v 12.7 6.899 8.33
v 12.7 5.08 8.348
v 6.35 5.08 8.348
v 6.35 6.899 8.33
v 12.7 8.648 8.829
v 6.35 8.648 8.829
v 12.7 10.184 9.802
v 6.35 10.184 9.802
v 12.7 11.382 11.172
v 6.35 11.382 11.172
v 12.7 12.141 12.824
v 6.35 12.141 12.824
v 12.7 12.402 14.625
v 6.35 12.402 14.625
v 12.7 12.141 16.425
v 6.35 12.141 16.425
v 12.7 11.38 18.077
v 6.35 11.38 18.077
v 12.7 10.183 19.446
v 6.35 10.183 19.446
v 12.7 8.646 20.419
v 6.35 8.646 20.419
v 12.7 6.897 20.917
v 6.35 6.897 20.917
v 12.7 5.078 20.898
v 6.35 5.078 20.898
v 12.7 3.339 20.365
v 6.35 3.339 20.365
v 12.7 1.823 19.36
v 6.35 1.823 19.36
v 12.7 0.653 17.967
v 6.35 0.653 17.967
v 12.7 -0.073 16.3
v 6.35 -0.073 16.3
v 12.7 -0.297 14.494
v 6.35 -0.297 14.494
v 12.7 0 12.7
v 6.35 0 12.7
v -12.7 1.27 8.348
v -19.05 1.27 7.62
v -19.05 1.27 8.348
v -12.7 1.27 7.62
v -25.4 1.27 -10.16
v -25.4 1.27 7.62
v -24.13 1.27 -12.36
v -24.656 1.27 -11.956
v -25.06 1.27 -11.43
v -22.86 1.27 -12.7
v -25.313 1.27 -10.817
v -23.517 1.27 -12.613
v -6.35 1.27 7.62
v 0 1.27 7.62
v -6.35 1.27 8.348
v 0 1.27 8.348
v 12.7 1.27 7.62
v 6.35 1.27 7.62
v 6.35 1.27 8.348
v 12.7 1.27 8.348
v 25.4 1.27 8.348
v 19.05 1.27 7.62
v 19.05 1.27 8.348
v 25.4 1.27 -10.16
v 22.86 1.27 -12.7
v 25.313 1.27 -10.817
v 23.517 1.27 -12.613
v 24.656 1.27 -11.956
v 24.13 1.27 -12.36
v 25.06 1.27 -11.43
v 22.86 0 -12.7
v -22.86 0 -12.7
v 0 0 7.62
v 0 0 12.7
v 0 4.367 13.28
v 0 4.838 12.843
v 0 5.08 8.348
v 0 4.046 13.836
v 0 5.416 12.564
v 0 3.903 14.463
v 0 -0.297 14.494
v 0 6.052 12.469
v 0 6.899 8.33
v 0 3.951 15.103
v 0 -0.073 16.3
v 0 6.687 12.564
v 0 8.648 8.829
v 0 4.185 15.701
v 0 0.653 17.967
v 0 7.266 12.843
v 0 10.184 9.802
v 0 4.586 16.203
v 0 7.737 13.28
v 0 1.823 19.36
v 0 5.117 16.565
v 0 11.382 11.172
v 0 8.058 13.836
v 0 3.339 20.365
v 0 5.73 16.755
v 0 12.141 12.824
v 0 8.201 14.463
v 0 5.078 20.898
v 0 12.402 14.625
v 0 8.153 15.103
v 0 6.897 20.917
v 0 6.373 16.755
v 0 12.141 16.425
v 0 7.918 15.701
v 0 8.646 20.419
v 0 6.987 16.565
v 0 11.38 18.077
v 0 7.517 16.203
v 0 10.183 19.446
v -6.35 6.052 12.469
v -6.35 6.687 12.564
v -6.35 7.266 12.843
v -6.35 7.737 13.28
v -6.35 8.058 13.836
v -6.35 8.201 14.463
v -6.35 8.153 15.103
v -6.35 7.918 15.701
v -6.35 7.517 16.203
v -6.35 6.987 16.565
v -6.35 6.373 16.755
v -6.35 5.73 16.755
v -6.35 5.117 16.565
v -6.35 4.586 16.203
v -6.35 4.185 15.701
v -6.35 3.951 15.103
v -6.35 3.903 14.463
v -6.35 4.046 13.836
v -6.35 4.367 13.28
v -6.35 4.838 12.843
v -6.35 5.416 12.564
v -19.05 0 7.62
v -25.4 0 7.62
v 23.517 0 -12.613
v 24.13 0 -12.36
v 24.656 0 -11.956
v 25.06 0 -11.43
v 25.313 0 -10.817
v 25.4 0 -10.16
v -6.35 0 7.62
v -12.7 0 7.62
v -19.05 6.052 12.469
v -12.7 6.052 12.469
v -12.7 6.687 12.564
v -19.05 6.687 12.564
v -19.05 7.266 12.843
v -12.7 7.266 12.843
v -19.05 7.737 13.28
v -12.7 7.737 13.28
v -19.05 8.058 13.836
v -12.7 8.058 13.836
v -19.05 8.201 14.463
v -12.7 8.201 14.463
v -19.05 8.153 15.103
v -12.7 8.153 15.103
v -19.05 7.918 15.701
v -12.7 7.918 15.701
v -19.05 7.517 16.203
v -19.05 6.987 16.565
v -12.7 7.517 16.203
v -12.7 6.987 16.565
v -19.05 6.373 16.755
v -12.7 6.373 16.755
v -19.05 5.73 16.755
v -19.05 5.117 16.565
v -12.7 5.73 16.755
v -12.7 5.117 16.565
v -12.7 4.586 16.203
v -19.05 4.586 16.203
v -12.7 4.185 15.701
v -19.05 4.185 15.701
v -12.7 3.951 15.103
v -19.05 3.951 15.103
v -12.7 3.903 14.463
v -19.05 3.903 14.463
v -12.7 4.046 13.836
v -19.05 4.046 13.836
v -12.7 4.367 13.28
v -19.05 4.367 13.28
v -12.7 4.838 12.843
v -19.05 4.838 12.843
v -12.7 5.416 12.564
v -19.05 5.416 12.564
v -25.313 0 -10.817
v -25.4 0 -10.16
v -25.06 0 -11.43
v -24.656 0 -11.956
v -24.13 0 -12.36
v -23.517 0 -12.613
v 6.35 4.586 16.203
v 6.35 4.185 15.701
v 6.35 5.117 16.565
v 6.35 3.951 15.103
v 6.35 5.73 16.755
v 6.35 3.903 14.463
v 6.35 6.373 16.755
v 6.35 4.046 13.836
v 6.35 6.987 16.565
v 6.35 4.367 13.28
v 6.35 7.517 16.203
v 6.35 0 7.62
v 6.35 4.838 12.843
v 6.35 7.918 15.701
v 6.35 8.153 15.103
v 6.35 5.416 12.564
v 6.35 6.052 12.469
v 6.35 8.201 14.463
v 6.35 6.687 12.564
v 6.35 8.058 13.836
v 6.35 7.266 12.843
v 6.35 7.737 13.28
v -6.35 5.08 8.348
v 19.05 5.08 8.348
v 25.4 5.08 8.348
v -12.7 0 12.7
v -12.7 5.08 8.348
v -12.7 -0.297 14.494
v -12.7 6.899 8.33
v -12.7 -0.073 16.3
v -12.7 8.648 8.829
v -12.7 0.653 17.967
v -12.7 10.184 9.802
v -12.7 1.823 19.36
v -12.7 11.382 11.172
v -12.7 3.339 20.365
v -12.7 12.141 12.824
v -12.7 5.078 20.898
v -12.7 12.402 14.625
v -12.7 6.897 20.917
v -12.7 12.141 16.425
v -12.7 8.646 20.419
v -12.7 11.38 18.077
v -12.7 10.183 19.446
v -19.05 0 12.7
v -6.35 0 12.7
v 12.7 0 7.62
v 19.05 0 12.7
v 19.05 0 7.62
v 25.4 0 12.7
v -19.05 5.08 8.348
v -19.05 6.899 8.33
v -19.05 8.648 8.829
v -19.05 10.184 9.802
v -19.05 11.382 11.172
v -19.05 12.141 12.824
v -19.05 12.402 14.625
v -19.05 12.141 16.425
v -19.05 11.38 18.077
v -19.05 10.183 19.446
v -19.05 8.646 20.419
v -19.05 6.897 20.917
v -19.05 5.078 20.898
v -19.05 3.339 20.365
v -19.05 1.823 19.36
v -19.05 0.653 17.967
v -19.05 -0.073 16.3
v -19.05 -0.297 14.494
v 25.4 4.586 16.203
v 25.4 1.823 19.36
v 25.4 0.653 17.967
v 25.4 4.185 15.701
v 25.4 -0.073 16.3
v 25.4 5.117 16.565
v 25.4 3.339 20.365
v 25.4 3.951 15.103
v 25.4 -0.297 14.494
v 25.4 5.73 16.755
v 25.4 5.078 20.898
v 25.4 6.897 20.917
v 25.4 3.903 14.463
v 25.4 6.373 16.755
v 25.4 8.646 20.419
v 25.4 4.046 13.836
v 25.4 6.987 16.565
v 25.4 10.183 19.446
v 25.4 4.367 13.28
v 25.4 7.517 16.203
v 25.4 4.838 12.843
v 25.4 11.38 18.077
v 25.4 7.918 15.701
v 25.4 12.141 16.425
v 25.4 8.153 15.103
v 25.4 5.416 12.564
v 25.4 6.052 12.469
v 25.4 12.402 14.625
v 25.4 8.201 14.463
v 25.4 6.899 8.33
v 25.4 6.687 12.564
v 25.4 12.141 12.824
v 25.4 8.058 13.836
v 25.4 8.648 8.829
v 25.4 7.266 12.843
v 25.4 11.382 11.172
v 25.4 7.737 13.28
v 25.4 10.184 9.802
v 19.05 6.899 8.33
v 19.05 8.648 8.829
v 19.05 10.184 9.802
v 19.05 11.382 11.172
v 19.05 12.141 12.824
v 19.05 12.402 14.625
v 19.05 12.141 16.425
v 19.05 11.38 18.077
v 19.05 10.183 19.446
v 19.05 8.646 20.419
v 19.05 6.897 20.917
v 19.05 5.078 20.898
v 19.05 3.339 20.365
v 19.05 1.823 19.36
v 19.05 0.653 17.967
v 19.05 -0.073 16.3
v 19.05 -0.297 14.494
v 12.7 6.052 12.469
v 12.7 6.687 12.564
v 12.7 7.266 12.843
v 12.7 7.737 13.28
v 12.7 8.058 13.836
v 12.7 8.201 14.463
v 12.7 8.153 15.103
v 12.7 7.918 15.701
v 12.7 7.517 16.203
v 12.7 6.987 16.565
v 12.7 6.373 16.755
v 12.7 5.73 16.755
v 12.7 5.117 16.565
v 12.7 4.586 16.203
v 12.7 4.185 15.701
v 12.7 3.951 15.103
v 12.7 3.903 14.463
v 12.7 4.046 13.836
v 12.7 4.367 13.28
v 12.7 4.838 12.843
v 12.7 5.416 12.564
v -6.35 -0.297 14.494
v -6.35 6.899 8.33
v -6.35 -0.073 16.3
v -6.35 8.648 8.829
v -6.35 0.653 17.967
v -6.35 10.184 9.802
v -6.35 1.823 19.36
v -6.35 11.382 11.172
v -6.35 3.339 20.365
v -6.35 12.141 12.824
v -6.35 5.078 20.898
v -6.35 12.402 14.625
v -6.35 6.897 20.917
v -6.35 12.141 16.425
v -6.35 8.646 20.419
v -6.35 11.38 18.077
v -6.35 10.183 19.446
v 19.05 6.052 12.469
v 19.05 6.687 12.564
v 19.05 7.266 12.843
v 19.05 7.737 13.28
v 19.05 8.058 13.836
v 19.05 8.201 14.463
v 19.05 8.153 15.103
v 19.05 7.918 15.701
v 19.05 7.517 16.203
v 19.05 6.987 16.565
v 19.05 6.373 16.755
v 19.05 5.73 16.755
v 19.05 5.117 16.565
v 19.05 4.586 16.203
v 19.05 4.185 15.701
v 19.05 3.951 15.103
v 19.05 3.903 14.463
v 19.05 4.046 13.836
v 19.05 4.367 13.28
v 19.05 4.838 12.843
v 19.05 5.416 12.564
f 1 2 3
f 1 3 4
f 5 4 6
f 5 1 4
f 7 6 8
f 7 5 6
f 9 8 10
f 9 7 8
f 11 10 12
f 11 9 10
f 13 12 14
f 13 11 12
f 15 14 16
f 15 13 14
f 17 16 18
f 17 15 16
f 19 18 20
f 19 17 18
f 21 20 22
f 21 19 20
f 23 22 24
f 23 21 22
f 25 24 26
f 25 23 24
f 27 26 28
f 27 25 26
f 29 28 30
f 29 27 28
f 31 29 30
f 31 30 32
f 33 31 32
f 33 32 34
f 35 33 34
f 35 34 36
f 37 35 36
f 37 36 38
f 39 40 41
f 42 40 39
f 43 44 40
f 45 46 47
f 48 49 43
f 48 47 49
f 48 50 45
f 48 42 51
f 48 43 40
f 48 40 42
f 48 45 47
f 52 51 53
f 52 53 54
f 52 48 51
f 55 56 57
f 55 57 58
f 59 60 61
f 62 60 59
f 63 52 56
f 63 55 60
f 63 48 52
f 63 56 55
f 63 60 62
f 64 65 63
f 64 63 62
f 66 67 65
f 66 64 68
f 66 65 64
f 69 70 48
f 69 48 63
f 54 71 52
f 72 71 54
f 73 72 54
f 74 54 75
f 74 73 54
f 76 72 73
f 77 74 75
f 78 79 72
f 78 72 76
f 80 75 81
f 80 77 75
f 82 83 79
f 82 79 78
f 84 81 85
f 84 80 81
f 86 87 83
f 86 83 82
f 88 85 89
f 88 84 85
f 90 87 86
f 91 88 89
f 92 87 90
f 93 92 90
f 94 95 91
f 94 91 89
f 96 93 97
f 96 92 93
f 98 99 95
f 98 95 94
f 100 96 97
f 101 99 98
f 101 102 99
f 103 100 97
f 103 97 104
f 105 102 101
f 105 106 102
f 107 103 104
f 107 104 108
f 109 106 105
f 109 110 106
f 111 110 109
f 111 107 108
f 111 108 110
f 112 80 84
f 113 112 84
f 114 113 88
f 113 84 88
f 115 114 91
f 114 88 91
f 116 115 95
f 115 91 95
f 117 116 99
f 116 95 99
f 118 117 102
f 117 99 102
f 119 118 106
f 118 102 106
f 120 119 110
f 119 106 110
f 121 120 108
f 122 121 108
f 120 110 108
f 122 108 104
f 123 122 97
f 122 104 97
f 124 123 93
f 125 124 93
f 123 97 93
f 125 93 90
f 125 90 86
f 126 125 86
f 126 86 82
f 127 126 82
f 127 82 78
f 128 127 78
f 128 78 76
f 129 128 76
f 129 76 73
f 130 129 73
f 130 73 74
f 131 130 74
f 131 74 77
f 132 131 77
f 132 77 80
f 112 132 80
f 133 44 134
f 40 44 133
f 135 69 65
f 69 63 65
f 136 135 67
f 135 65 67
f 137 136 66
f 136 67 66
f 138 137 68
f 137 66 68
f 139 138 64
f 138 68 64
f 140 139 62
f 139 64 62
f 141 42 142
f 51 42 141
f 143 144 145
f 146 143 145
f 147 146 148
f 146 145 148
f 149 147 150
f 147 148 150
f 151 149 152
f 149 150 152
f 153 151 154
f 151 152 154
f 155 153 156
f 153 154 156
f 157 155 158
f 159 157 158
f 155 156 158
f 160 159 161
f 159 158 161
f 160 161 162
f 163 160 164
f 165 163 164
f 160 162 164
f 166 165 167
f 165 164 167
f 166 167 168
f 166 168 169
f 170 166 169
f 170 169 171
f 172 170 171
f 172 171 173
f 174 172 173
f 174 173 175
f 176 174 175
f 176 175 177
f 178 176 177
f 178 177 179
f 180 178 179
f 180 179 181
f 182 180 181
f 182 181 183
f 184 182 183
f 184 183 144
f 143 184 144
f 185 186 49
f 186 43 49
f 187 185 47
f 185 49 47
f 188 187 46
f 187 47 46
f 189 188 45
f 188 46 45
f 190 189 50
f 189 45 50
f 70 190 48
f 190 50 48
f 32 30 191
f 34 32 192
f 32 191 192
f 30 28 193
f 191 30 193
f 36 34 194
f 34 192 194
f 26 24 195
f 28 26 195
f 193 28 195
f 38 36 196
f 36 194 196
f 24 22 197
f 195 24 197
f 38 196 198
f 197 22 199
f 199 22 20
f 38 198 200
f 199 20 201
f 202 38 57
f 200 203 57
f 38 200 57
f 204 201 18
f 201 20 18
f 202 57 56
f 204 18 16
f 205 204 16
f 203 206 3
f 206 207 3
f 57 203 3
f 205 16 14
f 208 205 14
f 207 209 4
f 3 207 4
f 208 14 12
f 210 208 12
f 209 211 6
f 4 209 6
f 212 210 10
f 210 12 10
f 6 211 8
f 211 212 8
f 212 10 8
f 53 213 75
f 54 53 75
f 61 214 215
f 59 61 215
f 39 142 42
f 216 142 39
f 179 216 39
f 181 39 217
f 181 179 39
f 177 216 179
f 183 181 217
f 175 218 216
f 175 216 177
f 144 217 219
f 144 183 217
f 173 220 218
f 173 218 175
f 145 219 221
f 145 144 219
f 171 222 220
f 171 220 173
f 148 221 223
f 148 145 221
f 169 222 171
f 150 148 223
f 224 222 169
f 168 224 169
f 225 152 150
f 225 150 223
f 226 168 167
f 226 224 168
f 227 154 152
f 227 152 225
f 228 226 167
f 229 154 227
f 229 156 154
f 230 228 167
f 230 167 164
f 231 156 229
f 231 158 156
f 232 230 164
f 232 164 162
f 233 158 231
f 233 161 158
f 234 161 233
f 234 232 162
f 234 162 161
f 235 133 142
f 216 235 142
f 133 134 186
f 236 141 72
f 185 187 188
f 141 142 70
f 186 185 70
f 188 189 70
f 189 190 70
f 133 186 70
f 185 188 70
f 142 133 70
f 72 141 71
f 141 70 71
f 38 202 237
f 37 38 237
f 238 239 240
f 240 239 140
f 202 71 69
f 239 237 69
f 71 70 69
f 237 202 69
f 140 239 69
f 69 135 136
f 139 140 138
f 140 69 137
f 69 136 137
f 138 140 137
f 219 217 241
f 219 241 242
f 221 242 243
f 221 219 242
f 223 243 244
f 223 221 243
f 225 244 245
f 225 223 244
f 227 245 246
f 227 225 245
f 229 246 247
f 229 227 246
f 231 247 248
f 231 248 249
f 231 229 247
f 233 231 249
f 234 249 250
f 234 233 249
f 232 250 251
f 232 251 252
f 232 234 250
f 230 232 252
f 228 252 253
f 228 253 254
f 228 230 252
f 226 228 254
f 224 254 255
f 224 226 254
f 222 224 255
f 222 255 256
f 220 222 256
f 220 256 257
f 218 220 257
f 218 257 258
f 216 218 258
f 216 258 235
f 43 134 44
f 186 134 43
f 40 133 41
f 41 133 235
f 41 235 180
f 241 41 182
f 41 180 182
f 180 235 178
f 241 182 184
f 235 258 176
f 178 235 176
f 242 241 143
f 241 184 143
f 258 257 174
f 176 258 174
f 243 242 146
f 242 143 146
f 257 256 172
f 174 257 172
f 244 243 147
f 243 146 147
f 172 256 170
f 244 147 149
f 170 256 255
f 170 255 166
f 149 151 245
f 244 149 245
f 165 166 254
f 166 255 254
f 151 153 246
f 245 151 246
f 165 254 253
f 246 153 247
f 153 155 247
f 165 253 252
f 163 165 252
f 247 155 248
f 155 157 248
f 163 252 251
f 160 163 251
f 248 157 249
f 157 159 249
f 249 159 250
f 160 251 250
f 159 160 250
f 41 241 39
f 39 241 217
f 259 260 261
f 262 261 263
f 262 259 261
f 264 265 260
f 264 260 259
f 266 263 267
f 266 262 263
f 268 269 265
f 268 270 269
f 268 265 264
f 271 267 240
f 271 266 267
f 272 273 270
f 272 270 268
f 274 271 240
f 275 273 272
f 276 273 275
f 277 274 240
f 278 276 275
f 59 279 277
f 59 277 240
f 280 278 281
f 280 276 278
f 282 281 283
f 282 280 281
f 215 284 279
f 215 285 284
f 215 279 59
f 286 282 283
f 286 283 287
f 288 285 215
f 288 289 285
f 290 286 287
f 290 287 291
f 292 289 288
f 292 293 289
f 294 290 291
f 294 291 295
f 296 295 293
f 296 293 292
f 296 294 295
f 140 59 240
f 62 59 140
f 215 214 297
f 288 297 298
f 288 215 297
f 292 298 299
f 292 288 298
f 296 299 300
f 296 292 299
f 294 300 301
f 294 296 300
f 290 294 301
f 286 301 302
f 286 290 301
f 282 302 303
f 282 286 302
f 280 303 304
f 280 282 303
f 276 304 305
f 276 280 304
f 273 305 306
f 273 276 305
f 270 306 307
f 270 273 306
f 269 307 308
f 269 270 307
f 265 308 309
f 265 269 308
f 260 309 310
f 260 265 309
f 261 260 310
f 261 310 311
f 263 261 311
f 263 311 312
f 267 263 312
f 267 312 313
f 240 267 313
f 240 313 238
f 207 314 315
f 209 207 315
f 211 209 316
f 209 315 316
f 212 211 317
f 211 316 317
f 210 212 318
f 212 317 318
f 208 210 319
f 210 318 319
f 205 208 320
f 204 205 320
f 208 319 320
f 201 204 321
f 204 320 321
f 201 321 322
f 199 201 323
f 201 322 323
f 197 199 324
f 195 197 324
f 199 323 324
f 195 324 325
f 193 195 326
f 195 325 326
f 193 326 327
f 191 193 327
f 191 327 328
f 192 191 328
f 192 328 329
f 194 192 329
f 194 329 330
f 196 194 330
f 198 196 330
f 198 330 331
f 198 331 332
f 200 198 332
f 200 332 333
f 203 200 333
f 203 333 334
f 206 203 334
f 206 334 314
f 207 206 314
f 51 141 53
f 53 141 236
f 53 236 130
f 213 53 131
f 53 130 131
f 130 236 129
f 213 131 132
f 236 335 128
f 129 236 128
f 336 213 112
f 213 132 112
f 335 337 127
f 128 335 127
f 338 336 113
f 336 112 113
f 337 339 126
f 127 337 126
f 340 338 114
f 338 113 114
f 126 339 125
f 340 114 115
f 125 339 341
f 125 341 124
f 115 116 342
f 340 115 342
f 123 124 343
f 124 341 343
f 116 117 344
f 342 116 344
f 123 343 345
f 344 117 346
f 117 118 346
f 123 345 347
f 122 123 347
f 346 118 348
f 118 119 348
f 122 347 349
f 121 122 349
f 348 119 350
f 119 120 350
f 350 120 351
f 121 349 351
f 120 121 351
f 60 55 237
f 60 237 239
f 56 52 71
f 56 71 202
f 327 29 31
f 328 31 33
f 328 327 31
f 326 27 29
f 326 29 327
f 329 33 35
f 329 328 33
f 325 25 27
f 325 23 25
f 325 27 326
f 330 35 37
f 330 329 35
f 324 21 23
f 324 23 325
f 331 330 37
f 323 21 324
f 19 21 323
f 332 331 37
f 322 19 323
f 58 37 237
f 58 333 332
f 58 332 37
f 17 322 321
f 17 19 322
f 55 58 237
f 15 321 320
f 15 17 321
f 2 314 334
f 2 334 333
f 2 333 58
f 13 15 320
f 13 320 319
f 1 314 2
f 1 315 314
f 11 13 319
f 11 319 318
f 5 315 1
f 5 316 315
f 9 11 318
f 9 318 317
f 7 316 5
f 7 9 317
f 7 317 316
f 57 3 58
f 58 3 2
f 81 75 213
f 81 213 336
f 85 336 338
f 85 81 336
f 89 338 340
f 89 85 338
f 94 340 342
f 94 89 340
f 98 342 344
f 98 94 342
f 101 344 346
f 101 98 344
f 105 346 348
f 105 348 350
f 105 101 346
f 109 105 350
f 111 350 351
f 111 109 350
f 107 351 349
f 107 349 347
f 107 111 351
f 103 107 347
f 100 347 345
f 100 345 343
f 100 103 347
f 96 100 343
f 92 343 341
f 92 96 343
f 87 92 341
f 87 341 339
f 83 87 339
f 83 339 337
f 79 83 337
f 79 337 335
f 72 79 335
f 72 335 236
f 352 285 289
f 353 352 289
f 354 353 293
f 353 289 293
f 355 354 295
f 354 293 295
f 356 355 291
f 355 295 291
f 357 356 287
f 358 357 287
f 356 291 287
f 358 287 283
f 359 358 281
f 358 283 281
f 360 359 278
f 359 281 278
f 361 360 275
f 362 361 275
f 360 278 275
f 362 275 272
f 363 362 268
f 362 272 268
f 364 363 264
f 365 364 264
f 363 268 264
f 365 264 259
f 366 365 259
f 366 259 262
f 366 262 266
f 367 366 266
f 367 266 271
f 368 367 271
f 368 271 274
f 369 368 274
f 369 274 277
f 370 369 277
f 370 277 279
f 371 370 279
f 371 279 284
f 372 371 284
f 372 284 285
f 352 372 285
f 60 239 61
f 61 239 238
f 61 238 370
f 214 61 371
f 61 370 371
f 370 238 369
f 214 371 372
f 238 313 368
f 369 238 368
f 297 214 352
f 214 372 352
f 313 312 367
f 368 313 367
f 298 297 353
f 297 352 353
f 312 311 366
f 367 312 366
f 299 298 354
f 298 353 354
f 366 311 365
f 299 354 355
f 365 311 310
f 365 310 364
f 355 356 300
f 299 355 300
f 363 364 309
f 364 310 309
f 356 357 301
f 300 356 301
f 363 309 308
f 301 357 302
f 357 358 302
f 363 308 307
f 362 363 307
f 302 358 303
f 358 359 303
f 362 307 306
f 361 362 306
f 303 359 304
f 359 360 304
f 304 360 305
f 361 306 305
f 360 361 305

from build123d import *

# Parameters (mm, degrees)
SKETCH1_W           = 50.8
SKETCH1_H           = 25.4
BOSS_EXTRUDE1_DEPTH = 5.08
SKETCH2_R           = 6.35
BOSS_EXTRUDE2_DEPTH = 6.35
LPATTERN1_COUNT     = 4
LPATTERN1_PITCH     = 12.7
SKETCH2_4_R         = 2.15503395
CUT_EXTRUDE2_DEPTH  = 76.2
SKETCH4_W           = 6.35
SKETCH4_H           = 5.08
CUT_EXTRUDE3_DEPTH  = 5.08
CUT_EXTRUDE4_DEPTH  = 3.81
FILLET1_R           = 2.54


with BuildPart() as part:
    # Sketch1 → Boss-Extrude1 (new body)
    with BuildSketch(Plane(origin=(0, 0, 0), x_dir=(1, 0, 0), z_dir=(0, 1, 0))):
        Rectangle(SKETCH1_W, SKETCH1_H)
    extrude(amount=BOSS_EXTRUDE1_DEPTH)

    # Sketch2 → Boss-Extrude2 (add)
    with BuildSketch(Plane(origin=(25.4, 0, 0), x_dir=(0, 0, -1), z_dir=(1, 0, 0))):
        with Locations((-14.623557735, 6.051646523)):
            Circle(SKETCH2_R)
    boss_extrude2 = extrude(amount=-BOSS_EXTRUDE2_DEPTH)

    # LPattern1: Boss-Extrude2 ×4
    with Locations(*[(-i * LPATTERN1_PITCH, 0, 0) for i in range(1, LPATTERN1_COUNT)]):
        add(boss_extrude2)

    # Sketch2_4 → Cut-Extrude2 (cut)
    with BuildSketch(Plane(origin=(25.4, 0, 0), x_dir=(0, 0, -1), z_dir=(1, 0, 0))):
        with Locations((-14.623557735, 6.051646523)):
            Circle(SKETCH2_4_R)
    extrude(amount=-CUT_EXTRUDE2_DEPTH, mode=Mode.SUBTRACT)

    # Sketch4 → Cut-Extrude3 (cut)
    with BuildSketch(Plane.XY.offset(12.7)):
        with Locations((15.875, 2.54)):
            Rectangle(SKETCH4_W, SKETCH4_H)
        with Locations((3.175, 2.54)):
            Rectangle(SKETCH4_W, SKETCH4_H)
        with Locations((-9.525, 2.54)):
            Rectangle(SKETCH4_W, SKETCH4_H)
        with Locations((-22.225, 2.54)):
            Rectangle(SKETCH4_W, SKETCH4_H)
    extrude(amount=-CUT_EXTRUDE3_DEPTH, mode=Mode.SUBTRACT)

    # Sketch5 → Cut-Extrude4 (cut)
    with BuildSketch(Plane(origin=(0, 5.08, 0), x_dir=(1, 0, 0), z_dir=(0, 1, 0))):
        Polygon((12.7, -7.62), (19.05, -7.62), (19.05, -8.348336382), (25.4, -8.348336382), (25.4, 12.7), (-25.4, 12.7), (-25.4, -7.62), (-19.05, -7.62), (-19.05, -8.348336382), (-12.7, -8.348336382), (-12.7, -7.62), (-6.35, -7.62), (-6.35, -8.348336382), (0, -8.348336382), (0, -7.62), (6.35, -7.62), (6.35, -8.348336382), (12.7, -8.348336382), align=None)
    extrude(amount=-CUT_EXTRUDE4_DEPTH, mode=Mode.SUBTRACT)

    # Fillet1
    fillet1_edges = [part.edges().sort_by_distance(p)[0] for p in [
        (-25.4, 0.635, -12.7),
        (25.4, 0.635, -12.7),
    ]]
    fillet(fillet1_edges, radius=FILLET1_R)


solid = part.part
